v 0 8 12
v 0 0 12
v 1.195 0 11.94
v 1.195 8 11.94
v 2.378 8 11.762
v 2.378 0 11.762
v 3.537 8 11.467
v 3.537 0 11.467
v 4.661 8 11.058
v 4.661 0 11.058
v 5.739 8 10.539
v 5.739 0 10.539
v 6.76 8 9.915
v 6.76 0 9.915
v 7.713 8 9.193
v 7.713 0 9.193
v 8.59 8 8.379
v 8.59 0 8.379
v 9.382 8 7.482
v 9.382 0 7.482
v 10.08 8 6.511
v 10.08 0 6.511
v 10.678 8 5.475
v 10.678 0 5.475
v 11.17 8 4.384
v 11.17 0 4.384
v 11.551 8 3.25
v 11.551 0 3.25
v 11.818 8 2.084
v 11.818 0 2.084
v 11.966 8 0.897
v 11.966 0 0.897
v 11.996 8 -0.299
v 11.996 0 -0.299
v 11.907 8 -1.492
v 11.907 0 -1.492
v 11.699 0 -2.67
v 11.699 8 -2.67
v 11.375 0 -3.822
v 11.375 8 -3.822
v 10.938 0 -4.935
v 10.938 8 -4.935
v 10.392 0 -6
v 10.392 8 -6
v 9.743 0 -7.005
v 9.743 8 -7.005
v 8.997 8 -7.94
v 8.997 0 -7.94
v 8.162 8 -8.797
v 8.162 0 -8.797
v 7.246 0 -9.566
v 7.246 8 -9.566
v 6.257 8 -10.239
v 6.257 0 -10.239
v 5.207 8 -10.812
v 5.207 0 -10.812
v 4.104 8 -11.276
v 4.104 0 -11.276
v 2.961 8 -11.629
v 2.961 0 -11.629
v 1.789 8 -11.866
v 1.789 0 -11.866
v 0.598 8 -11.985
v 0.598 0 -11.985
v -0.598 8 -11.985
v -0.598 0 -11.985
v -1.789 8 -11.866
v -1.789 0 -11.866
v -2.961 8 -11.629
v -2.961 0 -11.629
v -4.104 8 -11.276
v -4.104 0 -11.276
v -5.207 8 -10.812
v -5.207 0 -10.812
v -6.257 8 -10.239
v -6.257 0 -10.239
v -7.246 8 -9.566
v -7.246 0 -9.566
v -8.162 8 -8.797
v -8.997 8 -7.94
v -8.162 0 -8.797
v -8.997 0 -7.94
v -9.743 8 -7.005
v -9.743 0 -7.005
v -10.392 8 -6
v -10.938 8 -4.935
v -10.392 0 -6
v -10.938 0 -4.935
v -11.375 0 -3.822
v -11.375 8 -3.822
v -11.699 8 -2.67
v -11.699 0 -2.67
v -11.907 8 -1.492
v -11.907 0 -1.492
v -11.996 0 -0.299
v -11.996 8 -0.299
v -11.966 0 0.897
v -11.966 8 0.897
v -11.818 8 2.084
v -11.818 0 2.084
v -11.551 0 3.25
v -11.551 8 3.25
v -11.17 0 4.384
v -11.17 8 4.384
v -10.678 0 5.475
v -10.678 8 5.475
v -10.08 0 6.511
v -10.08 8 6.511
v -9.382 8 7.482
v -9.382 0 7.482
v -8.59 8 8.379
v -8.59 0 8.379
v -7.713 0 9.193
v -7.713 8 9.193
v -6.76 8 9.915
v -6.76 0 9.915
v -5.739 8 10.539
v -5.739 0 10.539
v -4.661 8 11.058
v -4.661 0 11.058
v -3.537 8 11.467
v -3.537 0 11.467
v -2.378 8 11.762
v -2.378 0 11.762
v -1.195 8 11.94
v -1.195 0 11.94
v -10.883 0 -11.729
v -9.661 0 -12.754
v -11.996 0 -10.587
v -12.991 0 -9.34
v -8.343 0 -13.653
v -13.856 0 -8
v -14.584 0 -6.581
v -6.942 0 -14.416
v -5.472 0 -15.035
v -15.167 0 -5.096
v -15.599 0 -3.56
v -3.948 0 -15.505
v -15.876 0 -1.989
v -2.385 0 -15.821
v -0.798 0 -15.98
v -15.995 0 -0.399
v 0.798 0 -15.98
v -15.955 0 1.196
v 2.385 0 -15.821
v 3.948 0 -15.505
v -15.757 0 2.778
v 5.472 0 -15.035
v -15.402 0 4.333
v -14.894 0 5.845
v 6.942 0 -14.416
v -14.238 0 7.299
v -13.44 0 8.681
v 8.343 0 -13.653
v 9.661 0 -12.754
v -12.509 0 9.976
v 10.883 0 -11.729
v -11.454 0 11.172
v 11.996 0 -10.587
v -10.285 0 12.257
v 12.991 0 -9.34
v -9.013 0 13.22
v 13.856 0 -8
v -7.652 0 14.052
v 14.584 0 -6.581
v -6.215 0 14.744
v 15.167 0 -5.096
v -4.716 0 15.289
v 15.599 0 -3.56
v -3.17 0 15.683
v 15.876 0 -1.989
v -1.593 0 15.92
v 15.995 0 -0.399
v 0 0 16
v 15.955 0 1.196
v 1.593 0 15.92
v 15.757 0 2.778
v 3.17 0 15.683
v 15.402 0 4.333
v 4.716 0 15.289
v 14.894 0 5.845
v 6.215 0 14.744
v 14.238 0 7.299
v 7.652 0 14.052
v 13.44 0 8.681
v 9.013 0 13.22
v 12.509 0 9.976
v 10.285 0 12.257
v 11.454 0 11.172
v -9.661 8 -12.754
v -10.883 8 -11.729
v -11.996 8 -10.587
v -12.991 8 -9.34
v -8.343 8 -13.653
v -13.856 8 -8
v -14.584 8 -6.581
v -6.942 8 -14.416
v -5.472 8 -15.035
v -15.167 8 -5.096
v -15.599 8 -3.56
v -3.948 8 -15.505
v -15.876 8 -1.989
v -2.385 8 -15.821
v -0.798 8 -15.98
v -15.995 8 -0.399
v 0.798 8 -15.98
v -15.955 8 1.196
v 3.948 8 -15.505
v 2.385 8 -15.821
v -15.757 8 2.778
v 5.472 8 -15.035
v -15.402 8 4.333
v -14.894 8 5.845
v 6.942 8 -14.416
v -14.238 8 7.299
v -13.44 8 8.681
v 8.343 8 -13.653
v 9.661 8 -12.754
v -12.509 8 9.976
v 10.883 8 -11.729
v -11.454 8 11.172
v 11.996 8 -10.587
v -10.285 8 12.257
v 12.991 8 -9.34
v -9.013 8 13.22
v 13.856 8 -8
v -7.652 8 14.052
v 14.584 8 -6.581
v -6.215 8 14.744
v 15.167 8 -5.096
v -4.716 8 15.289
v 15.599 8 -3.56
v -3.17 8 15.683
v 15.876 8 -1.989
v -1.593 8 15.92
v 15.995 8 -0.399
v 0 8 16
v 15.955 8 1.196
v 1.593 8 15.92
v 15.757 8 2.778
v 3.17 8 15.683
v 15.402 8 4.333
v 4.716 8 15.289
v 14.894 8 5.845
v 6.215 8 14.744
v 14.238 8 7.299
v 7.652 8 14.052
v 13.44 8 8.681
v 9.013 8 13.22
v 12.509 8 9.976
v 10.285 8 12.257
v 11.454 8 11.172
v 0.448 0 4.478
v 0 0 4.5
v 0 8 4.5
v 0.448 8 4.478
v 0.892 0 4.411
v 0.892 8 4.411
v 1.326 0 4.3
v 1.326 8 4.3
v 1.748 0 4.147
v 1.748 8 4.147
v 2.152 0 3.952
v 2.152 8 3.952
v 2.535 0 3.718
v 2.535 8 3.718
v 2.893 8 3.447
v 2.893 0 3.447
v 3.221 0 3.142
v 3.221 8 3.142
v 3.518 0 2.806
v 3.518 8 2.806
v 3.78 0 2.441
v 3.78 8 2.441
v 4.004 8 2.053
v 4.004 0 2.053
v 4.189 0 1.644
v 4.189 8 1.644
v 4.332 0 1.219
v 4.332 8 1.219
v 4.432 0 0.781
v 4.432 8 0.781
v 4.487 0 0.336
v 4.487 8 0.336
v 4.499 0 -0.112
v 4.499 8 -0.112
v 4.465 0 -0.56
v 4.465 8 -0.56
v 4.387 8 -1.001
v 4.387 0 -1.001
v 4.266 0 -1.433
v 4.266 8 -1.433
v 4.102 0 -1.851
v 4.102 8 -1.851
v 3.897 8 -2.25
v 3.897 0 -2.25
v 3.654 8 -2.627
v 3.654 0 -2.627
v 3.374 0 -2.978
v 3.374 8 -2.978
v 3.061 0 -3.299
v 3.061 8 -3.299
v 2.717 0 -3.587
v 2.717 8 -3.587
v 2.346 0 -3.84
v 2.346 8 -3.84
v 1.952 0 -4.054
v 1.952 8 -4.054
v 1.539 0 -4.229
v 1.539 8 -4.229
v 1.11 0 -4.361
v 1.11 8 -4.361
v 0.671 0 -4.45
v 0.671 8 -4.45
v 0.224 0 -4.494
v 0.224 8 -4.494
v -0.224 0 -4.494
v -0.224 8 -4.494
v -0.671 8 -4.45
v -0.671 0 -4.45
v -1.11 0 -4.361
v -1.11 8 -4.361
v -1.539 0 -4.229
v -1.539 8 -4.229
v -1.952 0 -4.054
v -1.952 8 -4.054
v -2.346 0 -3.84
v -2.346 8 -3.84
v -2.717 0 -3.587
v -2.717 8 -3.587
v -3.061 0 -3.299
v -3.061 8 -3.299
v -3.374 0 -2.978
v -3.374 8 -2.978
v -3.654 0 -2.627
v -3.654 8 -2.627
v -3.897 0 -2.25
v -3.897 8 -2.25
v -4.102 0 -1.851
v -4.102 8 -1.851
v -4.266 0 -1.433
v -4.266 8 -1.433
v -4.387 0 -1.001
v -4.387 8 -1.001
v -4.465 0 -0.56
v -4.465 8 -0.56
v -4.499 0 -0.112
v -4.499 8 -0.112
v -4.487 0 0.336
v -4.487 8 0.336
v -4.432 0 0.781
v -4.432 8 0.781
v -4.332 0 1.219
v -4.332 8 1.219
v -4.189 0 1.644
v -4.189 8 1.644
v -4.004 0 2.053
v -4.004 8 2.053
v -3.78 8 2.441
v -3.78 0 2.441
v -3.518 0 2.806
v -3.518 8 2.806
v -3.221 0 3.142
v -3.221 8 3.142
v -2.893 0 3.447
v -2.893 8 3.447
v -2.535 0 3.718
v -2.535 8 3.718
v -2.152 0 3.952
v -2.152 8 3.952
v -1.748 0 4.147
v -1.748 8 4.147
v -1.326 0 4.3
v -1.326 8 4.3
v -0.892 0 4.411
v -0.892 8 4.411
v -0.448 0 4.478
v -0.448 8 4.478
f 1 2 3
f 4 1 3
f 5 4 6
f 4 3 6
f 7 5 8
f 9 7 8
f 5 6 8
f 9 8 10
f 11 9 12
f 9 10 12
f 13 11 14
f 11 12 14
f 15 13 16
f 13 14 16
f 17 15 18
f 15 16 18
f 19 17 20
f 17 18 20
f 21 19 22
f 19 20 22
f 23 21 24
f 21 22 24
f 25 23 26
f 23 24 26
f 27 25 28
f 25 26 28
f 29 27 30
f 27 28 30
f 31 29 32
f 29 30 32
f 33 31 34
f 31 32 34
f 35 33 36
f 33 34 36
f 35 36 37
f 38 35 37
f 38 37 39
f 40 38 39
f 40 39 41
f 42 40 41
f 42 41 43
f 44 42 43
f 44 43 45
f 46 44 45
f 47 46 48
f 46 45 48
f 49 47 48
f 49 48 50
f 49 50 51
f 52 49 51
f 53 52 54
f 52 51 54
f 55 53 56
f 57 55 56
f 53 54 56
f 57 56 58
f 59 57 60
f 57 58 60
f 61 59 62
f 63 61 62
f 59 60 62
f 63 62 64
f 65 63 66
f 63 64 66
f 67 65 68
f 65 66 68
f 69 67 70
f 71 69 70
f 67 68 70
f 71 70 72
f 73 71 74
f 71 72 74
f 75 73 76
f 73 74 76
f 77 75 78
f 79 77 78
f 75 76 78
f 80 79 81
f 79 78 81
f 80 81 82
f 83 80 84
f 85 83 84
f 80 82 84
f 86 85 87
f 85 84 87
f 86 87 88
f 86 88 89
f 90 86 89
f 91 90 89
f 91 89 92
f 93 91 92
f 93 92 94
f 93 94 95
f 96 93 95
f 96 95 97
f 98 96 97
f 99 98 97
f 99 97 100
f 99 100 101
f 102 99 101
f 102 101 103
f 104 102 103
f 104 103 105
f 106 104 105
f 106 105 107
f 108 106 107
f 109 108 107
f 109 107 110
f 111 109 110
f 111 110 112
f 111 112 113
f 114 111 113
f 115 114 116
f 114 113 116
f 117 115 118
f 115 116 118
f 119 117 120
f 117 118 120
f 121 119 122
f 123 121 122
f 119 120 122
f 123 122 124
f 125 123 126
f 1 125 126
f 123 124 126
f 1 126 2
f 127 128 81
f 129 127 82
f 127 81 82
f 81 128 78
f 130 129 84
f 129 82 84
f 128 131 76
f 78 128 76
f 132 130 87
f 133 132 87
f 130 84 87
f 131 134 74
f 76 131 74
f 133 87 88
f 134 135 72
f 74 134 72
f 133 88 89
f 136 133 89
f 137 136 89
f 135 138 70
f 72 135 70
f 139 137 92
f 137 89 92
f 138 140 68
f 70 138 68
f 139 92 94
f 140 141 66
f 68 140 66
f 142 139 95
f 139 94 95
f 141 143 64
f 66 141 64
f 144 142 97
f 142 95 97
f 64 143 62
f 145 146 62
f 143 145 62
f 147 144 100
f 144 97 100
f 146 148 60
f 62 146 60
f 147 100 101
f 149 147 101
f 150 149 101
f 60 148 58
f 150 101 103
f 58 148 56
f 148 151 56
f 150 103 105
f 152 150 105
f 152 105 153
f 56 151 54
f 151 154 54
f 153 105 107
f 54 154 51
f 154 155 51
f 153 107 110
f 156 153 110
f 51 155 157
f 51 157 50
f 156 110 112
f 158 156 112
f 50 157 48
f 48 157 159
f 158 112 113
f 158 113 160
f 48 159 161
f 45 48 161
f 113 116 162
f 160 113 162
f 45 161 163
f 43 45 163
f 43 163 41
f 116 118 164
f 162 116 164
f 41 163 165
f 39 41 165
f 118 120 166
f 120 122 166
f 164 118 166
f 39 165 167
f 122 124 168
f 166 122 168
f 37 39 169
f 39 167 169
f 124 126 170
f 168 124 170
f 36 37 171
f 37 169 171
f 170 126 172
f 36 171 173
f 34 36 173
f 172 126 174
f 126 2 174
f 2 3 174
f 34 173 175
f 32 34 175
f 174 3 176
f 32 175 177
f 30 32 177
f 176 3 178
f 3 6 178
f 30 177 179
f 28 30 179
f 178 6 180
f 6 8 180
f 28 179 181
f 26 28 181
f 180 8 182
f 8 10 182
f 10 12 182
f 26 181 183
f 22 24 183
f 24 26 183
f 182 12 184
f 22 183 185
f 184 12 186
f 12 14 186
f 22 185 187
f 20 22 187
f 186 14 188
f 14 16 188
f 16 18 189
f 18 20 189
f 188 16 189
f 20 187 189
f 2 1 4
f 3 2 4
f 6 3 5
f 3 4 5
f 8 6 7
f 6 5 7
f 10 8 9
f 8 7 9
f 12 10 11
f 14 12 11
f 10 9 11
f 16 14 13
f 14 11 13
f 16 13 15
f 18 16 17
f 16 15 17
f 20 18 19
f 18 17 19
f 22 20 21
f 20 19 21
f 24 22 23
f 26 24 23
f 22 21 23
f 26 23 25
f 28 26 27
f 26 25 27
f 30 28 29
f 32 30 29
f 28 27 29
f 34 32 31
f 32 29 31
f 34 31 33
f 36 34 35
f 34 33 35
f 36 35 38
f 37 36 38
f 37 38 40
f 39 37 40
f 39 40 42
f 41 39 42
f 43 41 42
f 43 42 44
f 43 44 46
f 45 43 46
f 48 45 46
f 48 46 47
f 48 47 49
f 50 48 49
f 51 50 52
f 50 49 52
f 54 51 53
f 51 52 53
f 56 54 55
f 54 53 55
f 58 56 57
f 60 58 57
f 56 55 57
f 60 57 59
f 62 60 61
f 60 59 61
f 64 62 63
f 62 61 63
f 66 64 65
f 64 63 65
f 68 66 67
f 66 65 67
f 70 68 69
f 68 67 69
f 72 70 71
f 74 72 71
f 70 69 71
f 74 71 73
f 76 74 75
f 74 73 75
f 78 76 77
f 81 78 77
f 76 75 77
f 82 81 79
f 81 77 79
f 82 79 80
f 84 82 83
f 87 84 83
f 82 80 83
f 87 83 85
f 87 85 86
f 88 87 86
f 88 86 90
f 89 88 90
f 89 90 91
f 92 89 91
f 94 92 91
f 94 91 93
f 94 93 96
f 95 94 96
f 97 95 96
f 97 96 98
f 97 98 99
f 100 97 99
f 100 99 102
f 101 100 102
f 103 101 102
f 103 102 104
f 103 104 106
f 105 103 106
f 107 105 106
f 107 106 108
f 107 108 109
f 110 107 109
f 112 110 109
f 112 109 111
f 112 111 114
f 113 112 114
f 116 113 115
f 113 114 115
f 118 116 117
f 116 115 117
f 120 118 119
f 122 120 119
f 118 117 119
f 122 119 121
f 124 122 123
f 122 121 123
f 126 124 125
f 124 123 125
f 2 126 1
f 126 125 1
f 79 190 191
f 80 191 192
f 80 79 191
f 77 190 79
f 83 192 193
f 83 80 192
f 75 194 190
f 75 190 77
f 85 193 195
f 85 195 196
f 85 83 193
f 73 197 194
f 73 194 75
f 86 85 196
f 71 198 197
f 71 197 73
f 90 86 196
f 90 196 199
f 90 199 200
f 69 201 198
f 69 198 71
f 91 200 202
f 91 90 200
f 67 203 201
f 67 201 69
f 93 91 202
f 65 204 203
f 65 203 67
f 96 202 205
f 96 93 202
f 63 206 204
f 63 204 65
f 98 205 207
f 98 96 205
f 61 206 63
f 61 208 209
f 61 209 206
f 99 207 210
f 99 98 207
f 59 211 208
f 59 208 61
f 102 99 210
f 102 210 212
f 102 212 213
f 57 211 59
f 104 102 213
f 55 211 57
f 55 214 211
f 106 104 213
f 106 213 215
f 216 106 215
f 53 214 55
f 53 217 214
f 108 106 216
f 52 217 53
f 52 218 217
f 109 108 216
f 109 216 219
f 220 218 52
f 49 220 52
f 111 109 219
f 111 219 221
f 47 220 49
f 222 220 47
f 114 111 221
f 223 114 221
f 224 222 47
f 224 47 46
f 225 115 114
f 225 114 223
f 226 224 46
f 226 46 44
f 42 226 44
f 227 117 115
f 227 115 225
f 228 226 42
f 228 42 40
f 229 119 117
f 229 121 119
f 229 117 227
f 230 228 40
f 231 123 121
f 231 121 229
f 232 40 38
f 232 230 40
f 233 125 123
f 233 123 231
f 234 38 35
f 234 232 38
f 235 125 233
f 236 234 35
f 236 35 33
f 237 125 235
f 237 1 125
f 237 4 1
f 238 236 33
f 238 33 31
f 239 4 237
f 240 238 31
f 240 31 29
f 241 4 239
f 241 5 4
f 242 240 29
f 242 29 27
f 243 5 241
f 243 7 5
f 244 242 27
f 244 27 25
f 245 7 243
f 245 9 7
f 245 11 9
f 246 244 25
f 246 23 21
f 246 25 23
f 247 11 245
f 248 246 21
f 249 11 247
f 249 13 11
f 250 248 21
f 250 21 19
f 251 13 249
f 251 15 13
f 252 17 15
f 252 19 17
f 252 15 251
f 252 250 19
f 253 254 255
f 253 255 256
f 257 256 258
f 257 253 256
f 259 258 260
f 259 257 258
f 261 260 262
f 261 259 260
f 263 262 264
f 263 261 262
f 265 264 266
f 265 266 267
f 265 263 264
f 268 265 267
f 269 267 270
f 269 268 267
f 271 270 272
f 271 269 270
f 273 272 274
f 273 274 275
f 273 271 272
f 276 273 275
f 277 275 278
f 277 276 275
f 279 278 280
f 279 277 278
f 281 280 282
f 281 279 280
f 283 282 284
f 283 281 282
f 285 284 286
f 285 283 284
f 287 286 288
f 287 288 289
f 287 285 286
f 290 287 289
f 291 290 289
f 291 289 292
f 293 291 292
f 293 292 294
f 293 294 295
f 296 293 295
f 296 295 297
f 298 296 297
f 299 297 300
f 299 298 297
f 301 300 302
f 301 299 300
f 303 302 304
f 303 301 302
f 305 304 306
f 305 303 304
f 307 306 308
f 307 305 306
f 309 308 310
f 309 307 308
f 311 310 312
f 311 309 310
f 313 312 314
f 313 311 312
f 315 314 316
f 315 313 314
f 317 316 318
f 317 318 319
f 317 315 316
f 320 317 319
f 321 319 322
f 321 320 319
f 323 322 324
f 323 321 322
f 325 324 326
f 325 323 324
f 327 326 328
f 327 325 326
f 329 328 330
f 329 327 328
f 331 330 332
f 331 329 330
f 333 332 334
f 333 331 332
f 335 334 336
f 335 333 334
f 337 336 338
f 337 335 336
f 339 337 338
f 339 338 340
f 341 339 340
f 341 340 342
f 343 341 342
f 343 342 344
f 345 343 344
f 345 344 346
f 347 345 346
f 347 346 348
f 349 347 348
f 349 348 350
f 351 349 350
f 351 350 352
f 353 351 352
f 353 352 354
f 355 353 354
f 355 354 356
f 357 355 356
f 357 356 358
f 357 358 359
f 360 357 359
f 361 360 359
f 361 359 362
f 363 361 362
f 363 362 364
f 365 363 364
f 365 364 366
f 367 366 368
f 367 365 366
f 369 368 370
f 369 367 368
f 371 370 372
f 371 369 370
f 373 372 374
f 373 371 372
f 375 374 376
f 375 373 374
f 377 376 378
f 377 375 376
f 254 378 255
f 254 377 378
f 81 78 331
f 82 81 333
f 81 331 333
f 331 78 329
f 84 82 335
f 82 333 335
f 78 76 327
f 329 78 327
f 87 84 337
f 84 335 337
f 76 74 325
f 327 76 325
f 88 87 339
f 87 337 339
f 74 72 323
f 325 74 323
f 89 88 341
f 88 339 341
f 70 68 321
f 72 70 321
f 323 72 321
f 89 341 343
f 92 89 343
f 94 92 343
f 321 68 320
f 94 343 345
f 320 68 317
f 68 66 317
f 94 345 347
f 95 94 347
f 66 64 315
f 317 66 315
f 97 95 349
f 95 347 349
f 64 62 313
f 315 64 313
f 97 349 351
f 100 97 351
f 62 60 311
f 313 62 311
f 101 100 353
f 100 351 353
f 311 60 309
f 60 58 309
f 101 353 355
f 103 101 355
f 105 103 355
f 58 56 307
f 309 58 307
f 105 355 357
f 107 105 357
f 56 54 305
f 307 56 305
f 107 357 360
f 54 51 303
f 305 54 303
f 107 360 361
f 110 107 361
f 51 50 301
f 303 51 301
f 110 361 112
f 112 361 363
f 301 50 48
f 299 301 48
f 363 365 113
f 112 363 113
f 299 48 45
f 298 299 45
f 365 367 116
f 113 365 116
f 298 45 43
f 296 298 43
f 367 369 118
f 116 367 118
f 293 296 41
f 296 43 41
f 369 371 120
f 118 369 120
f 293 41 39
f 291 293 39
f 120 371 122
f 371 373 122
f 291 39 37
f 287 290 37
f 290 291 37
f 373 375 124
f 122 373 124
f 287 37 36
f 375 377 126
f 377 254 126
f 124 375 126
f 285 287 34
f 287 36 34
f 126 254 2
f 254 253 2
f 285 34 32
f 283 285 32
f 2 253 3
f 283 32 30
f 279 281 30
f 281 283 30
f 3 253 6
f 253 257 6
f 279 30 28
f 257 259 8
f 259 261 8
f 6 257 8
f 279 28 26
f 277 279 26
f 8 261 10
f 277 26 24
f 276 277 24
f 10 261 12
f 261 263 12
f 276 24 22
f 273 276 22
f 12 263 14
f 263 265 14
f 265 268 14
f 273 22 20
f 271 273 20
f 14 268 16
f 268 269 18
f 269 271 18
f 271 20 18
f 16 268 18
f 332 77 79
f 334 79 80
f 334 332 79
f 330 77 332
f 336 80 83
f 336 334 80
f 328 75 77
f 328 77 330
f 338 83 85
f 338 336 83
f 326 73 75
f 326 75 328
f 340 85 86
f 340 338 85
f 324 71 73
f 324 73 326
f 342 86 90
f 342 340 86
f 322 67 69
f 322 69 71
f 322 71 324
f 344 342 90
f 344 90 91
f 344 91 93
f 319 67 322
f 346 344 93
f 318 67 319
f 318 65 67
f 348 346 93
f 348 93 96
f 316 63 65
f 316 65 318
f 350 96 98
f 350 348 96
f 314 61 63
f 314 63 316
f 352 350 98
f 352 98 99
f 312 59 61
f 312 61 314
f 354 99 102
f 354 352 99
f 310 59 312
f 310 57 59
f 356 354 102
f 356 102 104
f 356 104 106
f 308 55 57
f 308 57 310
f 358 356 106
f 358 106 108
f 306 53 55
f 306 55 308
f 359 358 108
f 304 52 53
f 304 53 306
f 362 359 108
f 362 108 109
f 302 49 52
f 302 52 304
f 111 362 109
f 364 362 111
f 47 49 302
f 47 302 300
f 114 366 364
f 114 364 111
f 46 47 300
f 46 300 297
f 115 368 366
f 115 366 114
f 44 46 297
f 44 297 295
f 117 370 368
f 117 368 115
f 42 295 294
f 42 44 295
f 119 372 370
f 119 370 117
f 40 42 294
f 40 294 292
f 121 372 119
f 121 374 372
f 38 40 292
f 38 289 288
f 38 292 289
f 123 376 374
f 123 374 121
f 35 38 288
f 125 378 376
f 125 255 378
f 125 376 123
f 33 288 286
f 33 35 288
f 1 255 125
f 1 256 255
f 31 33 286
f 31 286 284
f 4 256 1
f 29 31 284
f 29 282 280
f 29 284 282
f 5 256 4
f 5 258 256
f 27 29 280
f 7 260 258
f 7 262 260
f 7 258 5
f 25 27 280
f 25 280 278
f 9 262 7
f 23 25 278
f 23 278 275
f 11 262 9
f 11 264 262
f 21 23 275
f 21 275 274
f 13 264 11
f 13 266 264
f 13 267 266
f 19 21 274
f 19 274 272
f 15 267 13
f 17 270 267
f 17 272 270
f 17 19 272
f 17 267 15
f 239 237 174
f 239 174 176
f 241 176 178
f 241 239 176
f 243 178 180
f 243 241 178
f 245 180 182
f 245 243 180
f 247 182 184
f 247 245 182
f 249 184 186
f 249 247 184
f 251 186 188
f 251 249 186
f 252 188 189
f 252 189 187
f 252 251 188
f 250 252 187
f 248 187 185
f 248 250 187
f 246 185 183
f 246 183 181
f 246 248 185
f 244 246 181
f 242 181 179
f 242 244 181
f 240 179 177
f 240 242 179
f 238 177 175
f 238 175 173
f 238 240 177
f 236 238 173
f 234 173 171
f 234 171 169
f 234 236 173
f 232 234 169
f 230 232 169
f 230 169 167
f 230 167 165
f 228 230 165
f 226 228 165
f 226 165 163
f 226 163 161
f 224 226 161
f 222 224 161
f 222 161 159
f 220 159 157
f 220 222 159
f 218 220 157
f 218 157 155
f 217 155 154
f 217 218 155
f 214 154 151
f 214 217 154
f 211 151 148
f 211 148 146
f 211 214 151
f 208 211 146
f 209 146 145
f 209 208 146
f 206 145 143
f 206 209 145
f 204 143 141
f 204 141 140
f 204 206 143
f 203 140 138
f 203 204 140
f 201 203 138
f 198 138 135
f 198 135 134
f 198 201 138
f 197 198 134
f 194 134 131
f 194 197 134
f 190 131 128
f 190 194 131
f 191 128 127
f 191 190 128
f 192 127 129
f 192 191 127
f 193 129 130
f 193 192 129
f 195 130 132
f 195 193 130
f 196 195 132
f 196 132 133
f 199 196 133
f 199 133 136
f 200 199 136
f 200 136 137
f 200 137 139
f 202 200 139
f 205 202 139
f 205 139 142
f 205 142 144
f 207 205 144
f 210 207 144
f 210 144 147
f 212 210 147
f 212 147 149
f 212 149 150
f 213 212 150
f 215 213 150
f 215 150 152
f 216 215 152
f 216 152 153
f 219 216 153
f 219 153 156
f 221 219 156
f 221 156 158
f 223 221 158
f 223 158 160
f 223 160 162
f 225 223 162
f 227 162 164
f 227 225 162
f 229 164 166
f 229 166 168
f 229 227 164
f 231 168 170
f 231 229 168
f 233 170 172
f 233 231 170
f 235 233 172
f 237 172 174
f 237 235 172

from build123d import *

# Parameters (mm, degrees)
SKETCH_1_R      = 12
SKETCH_1_R_2    = 4.5
EXTRUDE_1_DEPTH = 8
SKETCH_2_R      = 16
SKETCH_2_R_2    = 12
EXTRUDE_2_DEPTH = 8


with BuildPart() as part:
    # 草图1 → 凸台-拉伸1 (new body)
    with BuildSketch(Plane(origin=(0, 0, 0), x_dir=(1, 0, 0), z_dir=(0, 1, 0))):
        with Locations(Location((0, 0, 0), (0, 0, 270))):
            Circle(SKETCH_1_R)
        with Locations(Location((0, 0, 0), (0, 0, 270))):
            Circle(SKETCH_1_R_2, mode=Mode.SUBTRACT)
    extrude(amount=EXTRUDE_1_DEPTH)


with BuildPart() as body_2:
    # 草图2 → 凸台-拉伸2 (new body)
    with BuildSketch(Plane(origin=(0, 8, 0), x_dir=(1, 0, 0), z_dir=(0, 1, 0))):
        with Locations(Location((0, 0, 0), (0, 0, 270))):
            Circle(SKETCH_2_R)
        with Locations(Location((0, 0, 0), (0, 0, 270))):
            Circle(SKETCH_2_R_2, mode=Mode.SUBTRACT)
    extrude(amount=-EXTRUDE_2_DEPTH)


solid = Compound([part.part, body_2.part])
